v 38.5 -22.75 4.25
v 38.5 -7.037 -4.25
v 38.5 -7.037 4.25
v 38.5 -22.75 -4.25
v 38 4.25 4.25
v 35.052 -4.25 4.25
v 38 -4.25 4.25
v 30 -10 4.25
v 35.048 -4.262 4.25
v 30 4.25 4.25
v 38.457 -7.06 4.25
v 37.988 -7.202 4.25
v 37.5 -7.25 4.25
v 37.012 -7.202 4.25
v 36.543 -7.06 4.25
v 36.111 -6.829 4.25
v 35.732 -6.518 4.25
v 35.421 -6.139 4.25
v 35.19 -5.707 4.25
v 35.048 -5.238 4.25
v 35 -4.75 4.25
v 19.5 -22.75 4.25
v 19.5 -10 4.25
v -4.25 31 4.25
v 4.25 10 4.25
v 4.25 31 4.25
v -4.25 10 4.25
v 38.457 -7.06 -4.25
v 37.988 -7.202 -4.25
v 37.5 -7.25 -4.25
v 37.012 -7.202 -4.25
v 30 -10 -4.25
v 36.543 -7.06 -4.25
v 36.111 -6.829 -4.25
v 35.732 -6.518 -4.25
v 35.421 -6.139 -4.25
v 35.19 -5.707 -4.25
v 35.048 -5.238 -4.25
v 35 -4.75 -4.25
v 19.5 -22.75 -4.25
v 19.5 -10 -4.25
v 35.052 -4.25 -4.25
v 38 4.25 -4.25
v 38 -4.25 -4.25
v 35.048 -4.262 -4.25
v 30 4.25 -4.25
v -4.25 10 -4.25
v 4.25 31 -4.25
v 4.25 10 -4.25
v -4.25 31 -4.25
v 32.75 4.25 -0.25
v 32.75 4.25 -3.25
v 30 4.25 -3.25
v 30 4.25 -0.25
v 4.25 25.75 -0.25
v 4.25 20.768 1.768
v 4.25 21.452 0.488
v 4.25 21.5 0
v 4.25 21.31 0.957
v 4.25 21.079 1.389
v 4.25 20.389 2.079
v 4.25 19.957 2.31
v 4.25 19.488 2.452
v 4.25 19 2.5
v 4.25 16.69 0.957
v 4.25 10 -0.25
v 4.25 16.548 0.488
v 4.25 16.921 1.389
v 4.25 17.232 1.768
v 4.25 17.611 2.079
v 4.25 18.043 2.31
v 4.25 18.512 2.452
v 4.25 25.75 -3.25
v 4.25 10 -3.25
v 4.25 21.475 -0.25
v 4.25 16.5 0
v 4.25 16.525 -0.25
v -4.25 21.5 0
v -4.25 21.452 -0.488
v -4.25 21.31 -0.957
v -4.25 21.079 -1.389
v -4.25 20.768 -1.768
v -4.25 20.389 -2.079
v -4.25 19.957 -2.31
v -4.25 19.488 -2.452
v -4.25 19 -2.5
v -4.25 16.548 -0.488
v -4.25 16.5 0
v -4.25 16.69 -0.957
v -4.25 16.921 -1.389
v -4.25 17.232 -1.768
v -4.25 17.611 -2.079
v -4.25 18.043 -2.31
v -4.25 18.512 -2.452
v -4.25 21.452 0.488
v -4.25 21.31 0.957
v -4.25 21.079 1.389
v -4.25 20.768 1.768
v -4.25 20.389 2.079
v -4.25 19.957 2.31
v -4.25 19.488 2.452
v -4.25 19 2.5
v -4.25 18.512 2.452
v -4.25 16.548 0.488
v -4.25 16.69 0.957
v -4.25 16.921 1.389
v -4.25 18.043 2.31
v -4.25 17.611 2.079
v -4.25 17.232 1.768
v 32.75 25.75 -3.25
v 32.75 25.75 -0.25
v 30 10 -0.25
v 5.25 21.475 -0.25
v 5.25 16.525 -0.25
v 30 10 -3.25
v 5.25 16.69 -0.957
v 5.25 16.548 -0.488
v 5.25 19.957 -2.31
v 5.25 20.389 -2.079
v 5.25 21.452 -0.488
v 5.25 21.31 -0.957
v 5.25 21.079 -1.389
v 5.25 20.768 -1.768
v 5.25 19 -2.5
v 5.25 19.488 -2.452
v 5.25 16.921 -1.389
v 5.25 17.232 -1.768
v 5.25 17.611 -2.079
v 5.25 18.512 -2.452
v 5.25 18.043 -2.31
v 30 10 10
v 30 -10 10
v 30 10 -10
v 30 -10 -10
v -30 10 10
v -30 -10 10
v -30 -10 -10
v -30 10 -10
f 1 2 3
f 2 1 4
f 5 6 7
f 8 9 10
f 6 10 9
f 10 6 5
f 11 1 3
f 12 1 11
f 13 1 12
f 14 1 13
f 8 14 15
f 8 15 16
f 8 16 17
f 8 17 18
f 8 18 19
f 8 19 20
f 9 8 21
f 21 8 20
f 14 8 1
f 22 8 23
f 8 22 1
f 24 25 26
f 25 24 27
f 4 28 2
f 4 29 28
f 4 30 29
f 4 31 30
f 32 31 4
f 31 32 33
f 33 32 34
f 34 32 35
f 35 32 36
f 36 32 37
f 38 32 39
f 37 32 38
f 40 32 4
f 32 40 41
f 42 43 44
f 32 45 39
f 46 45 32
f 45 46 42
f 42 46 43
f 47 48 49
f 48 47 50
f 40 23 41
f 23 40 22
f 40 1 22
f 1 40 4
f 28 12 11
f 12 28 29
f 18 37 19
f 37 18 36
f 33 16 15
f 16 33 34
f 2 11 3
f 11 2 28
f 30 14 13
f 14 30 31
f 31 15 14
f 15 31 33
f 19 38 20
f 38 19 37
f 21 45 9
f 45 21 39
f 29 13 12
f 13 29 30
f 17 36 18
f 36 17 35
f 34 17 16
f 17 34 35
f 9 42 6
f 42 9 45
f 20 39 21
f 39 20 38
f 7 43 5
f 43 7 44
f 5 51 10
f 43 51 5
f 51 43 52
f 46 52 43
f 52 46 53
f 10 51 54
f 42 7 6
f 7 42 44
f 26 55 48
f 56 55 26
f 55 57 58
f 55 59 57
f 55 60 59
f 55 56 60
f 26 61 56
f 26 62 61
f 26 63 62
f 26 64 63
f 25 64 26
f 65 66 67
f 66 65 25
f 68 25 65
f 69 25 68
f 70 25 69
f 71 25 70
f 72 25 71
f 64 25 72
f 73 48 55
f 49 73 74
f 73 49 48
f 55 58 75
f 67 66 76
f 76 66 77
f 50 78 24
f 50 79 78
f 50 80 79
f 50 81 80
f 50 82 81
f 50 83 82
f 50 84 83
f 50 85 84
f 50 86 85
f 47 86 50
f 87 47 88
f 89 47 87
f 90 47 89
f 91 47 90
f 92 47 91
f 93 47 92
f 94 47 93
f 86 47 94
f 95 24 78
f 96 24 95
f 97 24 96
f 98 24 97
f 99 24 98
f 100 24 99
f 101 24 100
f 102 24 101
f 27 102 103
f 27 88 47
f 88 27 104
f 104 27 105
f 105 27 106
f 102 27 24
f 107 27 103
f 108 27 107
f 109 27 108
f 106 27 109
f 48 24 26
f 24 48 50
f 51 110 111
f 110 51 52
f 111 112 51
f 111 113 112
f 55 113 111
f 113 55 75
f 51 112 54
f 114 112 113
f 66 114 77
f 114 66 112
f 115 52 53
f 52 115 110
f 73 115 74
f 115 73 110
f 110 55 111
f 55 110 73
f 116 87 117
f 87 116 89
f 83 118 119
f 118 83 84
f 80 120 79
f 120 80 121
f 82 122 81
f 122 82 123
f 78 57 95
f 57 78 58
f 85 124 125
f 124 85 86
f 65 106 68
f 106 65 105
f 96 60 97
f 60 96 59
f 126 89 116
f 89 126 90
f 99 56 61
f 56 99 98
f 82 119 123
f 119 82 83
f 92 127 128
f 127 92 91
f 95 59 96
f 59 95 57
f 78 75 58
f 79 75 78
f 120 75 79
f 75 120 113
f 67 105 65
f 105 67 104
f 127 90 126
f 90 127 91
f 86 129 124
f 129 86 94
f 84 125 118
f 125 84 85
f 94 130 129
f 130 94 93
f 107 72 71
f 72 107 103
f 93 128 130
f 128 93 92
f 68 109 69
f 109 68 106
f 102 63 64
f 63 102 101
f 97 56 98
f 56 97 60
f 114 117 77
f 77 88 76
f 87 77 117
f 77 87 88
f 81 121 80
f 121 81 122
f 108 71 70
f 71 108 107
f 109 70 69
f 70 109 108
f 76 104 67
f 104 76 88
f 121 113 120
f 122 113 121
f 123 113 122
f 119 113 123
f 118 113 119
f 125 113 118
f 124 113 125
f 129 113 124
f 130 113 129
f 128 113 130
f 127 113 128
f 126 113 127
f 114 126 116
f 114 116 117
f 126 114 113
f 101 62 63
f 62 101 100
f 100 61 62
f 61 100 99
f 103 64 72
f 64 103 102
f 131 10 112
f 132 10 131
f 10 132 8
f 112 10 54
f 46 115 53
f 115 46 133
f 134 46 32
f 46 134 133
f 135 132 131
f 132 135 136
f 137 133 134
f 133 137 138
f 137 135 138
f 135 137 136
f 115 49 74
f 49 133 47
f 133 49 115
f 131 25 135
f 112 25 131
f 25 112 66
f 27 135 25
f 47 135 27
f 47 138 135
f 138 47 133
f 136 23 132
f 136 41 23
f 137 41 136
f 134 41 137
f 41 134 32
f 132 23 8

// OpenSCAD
// Parameters
overall_length_a = 38; //[19:76:1]
overall_length_b = 31; //[15.5:62:1]
thickness = 8.5; //[4.25:17:0.5]
hole_count_per_face = 1; //[1:3:1]
hole_diameter = 5; //[2.5:10:0.5]
hole_edge_offset_a = 12; //[6:24:1]
hole_edge_offset_b = 12; //[6:24:1]
inside_corner_radius = 1.5; //[0.75:3:0.25]
outside_corner_radius = 2; //[1:4:0.25]
gusset_enabled = 1; //[0:1:1]
gusset_thickness = 3; //[1.5:6:0.5]
overlap = 1; //[0.5:2:0.5]
hole_extra_length = 2; //[1:6:0.5]
extrusion_size = 20; //[10:40:1]
extrusion_length = 60; //[30:120:1]
extrusion_clearance = 0.5; //[0.2:2:0.1]

// Extrusion - complete geometry
module extrusion() {
  color([0.85, 0.85, 0.8]) {
    cube([extrusion_length, extrusion_size, extrusion_size], center=true);
  }
}

// Extrusion Inner Corner Bracket - complete geometry
module extrusion_inner_corner_bracket() {
  color("Silver") {
    difference() {
      cube([extrusion_size - 2*extrusion_clearance, extrusion_size - 2*extrusion_clearance, thickness], center=true);
      translate([extrusion_size/2 - extrusion_clearance - overlap, extrusion_size/2 - extrusion_clearance - overlap, 0])
        cylinder(d=hole_diameter, h=thickness + hole_extra_length, center=true, $fn=32);
    }
  }
}

// Extrusion Corner Bracket - complete geometry
module extrusion_corner_bracket() {
  color("Silver") {
    union() {
      translate([overall_length_a/2, 0, 0])
        cube([overall_length_a, thickness, thickness], center=true);
      translate([0, overall_length_b/2, 0])
        cube([thickness, overall_length_b, thickness], center=true);
      if (gusset_enabled) {
        translate([thickness/2 + (overall_length_a - thickness)/2 - overlap, thickness/2 + (overall_length_b - thickness)/2 - overlap, -thickness/2 + gusset_thickness/2 + overlap])
          cube([overall_length_a - thickness, overall_length_b - thickness, gusset_thickness], center=true);
      }
    }
  }
}

// Extrusion Corner Bracket 3D - complete geometry
module extrusion_corner_bracket_3D() {
  color("Silver") {
    difference() {
      extrusion_corner_bracket();
      translate([overall_length_a - hole_edge_offset_a, 0, 0])
        rotate([90, 0, 0])
        cylinder(d=hole_diameter, h=thickness + hole_extra_length, center=true, $fn=32);
      translate([0, overall_length_b - hole_edge_offset_b, 0])
        rotate([0, 90, 0])
        cylinder(d=hole_diameter, h=thickness + hole_extra_length, center=true, $fn=32);
    }
  }
}

// Extrusion Corner Bracket Hole Positions - complete geometry
module extrusion_corner_bracket_hole_positions() {
  color("Silver") {
    union() {
      translate([overall_length_a - hole_edge_offset_a, 0, 0])
        rotate([90, 0, 0])
        cylinder(d=hole_diameter, h=thickness + hole_extra_length, center=true, $fn=32);
      translate([0, overall_length_b - hole_edge_offset_b, 0])
        rotate([0, 90, 0])
        cylinder(d=hole_diameter, h=thickness + hole_extra_length, center=true, $fn=32);
    }
  }
}

// Assembly
module assembly() {
  extrusion();
  translate([extrusion_length/2 - overlap, -(extrusion_size/2 + thickness/2 - overlap), 0])
    extrusion_inner_corner_bracket();
  translate([0, 0, 0])
    extrusion_corner_bracket_3D();
}

assembly();
